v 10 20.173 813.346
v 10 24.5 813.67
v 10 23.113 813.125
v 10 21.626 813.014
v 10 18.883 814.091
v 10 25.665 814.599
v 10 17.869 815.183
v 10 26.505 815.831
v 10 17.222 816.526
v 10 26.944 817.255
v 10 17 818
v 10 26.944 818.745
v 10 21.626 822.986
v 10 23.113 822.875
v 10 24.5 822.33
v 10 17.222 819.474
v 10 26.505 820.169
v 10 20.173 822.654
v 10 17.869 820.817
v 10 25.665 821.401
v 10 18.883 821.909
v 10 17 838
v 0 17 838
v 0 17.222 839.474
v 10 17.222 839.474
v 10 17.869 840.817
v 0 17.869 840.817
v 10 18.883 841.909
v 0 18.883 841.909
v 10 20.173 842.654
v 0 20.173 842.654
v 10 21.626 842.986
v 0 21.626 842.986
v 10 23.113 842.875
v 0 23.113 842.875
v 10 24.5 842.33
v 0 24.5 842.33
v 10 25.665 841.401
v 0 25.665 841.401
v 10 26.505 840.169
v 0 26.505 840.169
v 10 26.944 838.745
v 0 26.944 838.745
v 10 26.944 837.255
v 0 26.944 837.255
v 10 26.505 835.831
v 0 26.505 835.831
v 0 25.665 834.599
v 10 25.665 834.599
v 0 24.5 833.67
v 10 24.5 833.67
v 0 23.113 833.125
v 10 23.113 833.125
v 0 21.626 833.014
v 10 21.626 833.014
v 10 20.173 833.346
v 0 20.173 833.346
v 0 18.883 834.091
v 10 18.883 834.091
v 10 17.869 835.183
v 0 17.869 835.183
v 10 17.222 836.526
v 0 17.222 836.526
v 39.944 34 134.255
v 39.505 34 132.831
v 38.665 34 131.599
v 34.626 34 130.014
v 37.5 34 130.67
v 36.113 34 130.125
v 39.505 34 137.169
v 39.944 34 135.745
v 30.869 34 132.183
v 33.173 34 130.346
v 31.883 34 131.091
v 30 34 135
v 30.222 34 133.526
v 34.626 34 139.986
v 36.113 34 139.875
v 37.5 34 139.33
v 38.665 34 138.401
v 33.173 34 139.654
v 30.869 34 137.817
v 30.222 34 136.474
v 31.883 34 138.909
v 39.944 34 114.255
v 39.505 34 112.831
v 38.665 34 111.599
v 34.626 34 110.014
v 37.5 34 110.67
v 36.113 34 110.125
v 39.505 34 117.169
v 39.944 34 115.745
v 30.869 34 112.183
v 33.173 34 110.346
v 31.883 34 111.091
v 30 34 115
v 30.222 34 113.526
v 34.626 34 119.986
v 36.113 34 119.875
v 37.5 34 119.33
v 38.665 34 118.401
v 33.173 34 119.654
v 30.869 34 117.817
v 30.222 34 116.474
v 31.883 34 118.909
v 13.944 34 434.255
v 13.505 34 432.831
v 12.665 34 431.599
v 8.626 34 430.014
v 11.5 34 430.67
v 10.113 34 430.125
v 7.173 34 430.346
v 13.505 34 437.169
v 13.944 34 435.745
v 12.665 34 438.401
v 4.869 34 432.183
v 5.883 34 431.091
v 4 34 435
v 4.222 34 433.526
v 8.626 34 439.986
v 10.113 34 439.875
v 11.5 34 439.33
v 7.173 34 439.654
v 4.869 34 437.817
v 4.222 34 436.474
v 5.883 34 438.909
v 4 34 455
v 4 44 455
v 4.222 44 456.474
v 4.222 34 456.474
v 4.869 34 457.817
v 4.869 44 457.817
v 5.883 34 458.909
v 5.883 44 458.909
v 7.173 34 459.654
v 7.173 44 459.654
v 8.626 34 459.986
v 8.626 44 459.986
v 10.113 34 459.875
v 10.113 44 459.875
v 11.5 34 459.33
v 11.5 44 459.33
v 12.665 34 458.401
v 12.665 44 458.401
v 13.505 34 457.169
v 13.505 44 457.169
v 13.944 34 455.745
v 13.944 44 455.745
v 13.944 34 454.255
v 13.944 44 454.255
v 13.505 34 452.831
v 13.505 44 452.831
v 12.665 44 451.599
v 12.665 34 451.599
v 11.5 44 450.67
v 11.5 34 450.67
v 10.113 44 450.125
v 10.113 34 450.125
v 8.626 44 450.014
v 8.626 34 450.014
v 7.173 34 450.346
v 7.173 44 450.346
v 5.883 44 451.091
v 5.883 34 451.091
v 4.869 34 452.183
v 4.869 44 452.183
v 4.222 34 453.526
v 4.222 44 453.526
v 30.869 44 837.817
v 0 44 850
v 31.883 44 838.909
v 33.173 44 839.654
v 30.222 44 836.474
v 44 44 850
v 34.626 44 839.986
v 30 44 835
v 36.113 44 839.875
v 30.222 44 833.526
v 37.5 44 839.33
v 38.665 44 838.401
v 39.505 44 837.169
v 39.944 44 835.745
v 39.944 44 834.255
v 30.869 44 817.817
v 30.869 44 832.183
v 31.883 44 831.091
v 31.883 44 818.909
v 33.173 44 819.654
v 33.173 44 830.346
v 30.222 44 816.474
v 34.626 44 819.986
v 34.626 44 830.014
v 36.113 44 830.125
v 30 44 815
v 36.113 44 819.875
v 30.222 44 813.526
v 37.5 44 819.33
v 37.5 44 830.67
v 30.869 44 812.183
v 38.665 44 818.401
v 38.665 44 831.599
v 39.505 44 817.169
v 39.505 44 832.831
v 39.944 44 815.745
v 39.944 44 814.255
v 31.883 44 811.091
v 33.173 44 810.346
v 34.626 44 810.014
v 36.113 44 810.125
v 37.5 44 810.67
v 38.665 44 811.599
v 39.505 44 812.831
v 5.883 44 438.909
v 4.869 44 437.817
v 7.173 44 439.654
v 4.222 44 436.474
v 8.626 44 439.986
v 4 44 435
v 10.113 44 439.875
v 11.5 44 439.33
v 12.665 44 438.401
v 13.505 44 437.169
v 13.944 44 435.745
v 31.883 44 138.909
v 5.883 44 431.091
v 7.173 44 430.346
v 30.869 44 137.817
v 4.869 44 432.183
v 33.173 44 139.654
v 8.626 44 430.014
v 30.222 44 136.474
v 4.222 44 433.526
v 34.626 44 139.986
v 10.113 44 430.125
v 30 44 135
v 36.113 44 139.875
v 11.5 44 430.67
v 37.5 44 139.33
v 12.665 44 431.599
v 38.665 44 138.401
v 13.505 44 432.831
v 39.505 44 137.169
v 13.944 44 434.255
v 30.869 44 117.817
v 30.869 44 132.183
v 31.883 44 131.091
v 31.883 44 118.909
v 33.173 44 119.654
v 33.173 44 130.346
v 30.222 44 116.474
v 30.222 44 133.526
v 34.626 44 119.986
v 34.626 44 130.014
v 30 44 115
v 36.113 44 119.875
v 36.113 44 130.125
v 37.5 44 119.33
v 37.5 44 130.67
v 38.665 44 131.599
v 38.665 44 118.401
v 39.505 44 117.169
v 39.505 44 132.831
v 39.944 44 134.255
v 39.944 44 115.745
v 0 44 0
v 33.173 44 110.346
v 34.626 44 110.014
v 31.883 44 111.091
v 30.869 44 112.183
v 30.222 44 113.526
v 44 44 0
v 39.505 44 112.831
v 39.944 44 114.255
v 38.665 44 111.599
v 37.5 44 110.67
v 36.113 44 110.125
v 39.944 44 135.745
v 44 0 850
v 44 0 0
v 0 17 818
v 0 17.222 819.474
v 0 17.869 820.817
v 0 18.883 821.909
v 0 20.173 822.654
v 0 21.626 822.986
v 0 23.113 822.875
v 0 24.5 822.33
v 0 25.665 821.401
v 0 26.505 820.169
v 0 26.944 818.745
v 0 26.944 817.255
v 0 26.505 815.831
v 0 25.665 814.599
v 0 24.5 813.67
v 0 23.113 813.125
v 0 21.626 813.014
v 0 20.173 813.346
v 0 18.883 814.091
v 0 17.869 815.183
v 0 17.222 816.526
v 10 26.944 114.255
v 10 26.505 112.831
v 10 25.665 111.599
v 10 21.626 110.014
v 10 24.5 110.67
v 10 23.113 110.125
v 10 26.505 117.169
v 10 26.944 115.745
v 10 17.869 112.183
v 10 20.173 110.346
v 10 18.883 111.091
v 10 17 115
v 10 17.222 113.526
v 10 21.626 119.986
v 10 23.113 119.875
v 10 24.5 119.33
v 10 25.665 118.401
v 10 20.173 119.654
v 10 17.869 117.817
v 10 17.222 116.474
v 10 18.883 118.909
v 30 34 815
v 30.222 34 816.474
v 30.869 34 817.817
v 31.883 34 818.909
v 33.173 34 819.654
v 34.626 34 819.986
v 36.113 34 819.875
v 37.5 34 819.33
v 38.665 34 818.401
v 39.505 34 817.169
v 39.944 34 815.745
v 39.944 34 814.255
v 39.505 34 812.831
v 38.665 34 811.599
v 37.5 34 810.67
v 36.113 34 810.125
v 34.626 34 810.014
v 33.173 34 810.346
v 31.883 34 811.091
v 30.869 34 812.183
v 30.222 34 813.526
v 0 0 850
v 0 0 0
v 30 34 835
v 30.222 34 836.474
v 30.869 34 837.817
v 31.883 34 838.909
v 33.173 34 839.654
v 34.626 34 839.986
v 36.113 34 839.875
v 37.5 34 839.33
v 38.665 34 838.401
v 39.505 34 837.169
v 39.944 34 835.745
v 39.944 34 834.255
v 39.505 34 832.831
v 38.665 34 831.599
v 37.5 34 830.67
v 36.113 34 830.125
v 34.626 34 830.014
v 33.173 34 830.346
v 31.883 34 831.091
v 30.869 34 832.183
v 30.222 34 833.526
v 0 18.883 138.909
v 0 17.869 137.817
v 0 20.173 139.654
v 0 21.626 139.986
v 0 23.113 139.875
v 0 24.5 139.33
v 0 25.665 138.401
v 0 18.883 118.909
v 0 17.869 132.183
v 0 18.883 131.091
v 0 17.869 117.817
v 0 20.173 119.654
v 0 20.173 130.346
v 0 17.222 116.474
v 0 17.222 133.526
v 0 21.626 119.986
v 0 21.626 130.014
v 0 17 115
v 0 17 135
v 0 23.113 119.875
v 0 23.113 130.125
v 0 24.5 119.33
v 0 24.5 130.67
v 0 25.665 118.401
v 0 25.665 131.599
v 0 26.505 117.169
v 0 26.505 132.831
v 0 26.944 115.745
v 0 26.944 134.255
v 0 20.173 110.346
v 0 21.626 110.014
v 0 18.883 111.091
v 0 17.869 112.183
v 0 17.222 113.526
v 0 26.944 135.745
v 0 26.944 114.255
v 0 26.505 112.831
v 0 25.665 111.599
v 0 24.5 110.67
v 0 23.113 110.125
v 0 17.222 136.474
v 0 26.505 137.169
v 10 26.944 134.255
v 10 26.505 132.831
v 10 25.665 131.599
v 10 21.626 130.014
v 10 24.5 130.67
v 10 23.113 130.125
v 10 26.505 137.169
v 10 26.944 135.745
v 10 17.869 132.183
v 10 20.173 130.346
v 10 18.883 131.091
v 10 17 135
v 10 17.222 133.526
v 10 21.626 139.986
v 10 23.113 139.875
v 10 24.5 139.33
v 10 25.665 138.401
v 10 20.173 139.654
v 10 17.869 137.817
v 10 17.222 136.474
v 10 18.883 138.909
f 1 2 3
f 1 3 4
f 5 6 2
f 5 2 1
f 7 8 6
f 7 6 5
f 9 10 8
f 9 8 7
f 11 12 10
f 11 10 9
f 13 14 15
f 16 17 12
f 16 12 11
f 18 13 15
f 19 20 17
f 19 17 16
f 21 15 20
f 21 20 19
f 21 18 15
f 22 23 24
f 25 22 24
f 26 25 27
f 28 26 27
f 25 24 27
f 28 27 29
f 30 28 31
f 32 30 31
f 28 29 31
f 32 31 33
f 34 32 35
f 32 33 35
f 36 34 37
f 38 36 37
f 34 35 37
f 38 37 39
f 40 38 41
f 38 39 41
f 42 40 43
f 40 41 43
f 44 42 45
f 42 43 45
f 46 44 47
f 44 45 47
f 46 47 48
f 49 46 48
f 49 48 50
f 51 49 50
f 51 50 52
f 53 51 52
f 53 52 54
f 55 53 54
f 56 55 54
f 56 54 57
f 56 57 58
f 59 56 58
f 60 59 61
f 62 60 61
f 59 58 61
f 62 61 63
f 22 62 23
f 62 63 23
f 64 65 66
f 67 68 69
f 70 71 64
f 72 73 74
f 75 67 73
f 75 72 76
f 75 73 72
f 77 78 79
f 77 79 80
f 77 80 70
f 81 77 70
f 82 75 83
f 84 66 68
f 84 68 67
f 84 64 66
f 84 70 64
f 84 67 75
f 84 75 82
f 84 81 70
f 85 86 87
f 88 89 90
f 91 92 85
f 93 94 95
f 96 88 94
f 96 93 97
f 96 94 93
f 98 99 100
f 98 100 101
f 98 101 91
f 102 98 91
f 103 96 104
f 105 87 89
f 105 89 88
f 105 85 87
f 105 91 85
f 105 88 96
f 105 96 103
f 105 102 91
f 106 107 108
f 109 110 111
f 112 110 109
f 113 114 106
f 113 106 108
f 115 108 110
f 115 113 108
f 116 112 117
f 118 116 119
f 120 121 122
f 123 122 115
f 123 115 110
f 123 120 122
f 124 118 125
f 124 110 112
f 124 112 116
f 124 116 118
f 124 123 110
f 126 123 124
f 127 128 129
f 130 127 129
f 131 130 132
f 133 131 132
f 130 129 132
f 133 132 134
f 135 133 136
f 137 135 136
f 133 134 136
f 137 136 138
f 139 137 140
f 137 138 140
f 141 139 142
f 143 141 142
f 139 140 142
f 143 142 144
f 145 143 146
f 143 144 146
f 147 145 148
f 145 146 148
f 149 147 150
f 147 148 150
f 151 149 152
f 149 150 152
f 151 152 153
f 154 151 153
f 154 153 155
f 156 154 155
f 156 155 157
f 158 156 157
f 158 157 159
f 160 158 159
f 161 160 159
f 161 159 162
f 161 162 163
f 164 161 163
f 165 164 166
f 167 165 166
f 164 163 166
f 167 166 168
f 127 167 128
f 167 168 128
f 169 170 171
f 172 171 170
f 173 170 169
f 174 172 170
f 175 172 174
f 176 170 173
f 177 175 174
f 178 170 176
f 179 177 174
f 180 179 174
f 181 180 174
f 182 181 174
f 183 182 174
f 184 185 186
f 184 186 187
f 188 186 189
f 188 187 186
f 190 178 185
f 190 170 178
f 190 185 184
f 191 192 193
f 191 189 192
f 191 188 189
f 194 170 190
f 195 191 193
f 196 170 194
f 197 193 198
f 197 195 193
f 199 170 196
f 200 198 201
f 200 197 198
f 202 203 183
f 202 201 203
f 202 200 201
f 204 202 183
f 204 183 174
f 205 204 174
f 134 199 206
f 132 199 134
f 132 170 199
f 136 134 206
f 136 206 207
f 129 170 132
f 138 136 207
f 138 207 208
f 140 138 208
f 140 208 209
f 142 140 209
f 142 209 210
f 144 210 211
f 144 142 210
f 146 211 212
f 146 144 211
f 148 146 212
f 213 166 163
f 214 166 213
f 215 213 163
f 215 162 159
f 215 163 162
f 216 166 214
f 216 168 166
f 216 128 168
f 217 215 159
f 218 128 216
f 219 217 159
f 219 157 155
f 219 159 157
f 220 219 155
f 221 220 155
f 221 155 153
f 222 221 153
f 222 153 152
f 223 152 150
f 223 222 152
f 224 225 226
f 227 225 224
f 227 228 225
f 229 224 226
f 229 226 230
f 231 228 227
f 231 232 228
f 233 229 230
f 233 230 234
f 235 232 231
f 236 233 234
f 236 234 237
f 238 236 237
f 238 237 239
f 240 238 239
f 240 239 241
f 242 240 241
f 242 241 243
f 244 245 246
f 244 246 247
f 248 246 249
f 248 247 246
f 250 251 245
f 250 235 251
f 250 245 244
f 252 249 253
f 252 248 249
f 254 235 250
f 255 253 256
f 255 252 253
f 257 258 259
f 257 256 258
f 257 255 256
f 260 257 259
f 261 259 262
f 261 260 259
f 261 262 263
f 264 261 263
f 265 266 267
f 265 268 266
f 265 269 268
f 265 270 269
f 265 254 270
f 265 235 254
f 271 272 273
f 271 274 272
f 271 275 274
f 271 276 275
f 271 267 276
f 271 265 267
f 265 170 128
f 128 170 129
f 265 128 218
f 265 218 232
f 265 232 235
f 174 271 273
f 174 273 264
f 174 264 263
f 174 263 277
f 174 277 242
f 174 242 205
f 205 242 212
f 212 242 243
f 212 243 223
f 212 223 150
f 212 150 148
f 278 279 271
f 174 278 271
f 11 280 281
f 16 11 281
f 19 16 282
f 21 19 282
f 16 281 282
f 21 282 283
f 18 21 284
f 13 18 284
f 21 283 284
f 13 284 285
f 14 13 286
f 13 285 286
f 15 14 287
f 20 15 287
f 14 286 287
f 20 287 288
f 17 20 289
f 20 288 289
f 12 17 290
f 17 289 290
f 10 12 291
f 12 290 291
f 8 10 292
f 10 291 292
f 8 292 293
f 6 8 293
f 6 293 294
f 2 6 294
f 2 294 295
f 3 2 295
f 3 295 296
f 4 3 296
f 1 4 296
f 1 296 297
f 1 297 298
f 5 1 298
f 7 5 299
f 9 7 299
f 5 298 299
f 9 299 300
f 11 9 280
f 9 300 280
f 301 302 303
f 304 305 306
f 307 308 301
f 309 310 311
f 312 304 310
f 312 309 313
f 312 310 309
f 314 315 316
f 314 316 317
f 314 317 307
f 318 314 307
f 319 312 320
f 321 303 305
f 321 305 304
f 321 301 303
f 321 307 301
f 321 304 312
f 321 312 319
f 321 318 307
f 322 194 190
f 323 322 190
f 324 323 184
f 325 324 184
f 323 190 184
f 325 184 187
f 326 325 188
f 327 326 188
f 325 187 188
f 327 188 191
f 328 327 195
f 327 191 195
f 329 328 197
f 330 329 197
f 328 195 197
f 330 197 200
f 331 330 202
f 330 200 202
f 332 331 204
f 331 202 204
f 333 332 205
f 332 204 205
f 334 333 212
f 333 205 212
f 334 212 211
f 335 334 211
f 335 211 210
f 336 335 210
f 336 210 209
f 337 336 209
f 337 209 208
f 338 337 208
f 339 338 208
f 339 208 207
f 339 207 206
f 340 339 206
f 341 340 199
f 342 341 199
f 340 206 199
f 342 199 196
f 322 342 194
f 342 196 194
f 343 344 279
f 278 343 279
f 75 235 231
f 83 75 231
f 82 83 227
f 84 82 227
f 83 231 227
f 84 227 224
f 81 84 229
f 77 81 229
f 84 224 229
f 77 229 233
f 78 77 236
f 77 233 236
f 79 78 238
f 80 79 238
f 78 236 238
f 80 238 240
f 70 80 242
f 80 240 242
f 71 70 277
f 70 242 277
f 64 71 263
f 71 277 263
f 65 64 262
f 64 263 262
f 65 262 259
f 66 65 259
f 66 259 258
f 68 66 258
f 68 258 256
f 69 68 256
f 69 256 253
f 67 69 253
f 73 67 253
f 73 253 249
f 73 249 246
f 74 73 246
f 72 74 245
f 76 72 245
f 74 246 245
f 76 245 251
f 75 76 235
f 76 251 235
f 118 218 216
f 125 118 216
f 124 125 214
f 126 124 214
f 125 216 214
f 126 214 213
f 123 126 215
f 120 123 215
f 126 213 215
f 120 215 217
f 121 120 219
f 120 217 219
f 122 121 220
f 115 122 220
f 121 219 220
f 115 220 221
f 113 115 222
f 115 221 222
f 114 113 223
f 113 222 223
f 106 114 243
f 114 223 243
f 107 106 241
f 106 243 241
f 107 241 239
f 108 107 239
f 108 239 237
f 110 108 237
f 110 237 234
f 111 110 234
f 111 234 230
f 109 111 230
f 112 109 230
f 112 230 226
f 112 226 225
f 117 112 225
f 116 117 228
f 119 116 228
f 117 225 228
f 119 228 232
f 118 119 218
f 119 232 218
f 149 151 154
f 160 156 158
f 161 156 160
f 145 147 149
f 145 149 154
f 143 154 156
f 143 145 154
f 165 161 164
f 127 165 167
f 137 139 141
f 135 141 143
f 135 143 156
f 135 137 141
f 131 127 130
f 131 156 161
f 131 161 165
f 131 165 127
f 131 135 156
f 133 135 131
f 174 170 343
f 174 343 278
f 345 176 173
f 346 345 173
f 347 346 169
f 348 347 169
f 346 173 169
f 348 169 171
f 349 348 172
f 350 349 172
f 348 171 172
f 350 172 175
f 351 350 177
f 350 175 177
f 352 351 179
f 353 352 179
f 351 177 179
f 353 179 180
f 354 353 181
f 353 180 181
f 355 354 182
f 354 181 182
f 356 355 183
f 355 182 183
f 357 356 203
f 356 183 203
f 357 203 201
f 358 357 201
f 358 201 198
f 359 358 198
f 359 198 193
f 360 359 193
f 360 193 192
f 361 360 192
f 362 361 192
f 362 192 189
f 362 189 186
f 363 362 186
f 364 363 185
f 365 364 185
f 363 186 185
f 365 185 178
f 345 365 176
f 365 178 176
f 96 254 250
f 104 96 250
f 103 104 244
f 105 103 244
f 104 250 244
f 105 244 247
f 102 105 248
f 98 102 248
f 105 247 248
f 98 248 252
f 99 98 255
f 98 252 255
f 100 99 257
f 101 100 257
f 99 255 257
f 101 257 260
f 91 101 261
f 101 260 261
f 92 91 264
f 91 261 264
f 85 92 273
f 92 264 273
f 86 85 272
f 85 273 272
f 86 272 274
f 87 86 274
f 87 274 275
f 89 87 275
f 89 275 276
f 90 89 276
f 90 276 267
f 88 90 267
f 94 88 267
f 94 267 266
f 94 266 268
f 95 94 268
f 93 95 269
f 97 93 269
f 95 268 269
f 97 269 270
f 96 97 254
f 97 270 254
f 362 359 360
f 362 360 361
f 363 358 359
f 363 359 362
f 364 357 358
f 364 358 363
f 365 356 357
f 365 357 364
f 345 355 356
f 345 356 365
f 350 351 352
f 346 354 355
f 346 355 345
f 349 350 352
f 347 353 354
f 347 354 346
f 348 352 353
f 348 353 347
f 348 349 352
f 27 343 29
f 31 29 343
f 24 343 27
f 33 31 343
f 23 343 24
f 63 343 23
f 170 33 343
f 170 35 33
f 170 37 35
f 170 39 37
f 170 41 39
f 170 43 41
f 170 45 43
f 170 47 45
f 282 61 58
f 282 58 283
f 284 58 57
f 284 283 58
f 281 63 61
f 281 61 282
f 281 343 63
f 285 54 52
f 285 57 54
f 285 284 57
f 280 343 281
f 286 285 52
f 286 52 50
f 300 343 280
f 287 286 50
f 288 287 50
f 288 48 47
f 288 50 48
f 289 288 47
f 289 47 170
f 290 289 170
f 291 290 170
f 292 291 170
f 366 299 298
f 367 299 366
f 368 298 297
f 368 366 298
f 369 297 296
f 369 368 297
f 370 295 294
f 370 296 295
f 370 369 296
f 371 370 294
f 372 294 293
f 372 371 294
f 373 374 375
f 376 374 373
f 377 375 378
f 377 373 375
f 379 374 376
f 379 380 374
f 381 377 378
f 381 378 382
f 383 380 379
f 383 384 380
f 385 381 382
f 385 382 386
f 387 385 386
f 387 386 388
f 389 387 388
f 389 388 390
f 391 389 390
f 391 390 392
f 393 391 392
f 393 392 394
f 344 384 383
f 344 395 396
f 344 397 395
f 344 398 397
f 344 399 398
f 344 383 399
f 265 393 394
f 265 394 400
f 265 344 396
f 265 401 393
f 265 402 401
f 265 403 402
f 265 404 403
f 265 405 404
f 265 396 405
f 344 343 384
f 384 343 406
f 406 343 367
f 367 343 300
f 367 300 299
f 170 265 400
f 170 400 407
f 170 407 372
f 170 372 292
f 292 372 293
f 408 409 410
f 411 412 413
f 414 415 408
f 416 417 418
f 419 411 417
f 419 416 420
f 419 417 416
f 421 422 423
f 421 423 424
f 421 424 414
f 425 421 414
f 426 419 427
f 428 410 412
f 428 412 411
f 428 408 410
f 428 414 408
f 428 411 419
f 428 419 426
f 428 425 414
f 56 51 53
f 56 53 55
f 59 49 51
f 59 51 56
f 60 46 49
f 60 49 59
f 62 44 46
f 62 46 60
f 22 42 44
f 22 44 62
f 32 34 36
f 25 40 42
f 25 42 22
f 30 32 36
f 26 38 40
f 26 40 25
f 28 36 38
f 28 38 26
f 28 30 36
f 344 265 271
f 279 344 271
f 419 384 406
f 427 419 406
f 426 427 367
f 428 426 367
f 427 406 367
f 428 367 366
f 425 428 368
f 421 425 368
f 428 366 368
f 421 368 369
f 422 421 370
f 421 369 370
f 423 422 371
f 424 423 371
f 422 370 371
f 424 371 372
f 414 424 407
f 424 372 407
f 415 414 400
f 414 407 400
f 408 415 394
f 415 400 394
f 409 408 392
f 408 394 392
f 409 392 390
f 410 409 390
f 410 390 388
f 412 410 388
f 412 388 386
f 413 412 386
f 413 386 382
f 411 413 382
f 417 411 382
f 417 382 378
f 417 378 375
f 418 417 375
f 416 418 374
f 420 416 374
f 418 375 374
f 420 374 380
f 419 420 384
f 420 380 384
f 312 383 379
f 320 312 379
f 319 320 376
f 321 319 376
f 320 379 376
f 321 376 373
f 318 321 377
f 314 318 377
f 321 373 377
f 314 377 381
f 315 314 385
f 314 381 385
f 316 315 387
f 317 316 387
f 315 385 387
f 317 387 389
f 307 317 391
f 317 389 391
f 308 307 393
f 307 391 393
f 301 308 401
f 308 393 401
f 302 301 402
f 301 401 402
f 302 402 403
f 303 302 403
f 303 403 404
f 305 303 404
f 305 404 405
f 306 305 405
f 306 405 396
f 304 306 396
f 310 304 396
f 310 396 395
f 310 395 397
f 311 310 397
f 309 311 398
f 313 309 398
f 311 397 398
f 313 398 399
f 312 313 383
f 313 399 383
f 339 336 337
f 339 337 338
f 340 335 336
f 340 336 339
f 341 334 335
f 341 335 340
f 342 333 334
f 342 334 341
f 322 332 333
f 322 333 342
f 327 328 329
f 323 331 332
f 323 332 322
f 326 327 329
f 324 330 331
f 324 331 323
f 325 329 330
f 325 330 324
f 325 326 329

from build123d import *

# Parameters (mm, degrees)
F0_W     = 44
F0_H     = 44
F1_DEPTH = 850
F2_R     = 5
F3_DEPTH = 10
F4_R     = 5
F5_DEPTH = 10


# Not quite as in the source:
# - a feature names something its author has since deleted; it is built from what else it names


with BuildPart() as f1:
    # F0 (on Top) → F1 (new body)
    with BuildSketch(Plane.XY):
        with Locations((22, 22)):
            Rectangle(F0_W, F0_H)
    extrude(amount=F1_DEPTH)

    # F2 (on face) → F3 (cut)
    with BuildSketch(Plane(origin=(0, 44, 0), x_dir=(-1, 0, 0), z_dir=(0, 1, 0))):
        with Locations((-35, 115)):
            Circle(F2_R)
        with Locations((-35, 135)):
            Circle(F2_R)
        with Locations((-9, 435)):
            Circle(F2_R)
        with Locations((-35, 835)):
            Circle(F2_R)
        with Locations((-35, 815)):
            Circle(F2_R)
        with Locations((-9, 455)):
            Circle(F2_R)
    extrude(amount=-F3_DEPTH, mode=Mode.SUBTRACT)

    # F4 (on face) → F5 (cut)
    with BuildSketch(Plane(origin=(0, 0, 0), x_dir=(0, -1, 0), z_dir=(-1, 0, 0))):
        with Locations((-22, 135)):
            Circle(F4_R)
        with Locations((-22, 115)):
            Circle(F4_R)
        with Locations((-22, 838)):
            Circle(F4_R)
        with Locations((-22, 818)):
            Circle(F4_R)
    extrude(amount=-F5_DEPTH, mode=Mode.SUBTRACT)


solid = f1.part
